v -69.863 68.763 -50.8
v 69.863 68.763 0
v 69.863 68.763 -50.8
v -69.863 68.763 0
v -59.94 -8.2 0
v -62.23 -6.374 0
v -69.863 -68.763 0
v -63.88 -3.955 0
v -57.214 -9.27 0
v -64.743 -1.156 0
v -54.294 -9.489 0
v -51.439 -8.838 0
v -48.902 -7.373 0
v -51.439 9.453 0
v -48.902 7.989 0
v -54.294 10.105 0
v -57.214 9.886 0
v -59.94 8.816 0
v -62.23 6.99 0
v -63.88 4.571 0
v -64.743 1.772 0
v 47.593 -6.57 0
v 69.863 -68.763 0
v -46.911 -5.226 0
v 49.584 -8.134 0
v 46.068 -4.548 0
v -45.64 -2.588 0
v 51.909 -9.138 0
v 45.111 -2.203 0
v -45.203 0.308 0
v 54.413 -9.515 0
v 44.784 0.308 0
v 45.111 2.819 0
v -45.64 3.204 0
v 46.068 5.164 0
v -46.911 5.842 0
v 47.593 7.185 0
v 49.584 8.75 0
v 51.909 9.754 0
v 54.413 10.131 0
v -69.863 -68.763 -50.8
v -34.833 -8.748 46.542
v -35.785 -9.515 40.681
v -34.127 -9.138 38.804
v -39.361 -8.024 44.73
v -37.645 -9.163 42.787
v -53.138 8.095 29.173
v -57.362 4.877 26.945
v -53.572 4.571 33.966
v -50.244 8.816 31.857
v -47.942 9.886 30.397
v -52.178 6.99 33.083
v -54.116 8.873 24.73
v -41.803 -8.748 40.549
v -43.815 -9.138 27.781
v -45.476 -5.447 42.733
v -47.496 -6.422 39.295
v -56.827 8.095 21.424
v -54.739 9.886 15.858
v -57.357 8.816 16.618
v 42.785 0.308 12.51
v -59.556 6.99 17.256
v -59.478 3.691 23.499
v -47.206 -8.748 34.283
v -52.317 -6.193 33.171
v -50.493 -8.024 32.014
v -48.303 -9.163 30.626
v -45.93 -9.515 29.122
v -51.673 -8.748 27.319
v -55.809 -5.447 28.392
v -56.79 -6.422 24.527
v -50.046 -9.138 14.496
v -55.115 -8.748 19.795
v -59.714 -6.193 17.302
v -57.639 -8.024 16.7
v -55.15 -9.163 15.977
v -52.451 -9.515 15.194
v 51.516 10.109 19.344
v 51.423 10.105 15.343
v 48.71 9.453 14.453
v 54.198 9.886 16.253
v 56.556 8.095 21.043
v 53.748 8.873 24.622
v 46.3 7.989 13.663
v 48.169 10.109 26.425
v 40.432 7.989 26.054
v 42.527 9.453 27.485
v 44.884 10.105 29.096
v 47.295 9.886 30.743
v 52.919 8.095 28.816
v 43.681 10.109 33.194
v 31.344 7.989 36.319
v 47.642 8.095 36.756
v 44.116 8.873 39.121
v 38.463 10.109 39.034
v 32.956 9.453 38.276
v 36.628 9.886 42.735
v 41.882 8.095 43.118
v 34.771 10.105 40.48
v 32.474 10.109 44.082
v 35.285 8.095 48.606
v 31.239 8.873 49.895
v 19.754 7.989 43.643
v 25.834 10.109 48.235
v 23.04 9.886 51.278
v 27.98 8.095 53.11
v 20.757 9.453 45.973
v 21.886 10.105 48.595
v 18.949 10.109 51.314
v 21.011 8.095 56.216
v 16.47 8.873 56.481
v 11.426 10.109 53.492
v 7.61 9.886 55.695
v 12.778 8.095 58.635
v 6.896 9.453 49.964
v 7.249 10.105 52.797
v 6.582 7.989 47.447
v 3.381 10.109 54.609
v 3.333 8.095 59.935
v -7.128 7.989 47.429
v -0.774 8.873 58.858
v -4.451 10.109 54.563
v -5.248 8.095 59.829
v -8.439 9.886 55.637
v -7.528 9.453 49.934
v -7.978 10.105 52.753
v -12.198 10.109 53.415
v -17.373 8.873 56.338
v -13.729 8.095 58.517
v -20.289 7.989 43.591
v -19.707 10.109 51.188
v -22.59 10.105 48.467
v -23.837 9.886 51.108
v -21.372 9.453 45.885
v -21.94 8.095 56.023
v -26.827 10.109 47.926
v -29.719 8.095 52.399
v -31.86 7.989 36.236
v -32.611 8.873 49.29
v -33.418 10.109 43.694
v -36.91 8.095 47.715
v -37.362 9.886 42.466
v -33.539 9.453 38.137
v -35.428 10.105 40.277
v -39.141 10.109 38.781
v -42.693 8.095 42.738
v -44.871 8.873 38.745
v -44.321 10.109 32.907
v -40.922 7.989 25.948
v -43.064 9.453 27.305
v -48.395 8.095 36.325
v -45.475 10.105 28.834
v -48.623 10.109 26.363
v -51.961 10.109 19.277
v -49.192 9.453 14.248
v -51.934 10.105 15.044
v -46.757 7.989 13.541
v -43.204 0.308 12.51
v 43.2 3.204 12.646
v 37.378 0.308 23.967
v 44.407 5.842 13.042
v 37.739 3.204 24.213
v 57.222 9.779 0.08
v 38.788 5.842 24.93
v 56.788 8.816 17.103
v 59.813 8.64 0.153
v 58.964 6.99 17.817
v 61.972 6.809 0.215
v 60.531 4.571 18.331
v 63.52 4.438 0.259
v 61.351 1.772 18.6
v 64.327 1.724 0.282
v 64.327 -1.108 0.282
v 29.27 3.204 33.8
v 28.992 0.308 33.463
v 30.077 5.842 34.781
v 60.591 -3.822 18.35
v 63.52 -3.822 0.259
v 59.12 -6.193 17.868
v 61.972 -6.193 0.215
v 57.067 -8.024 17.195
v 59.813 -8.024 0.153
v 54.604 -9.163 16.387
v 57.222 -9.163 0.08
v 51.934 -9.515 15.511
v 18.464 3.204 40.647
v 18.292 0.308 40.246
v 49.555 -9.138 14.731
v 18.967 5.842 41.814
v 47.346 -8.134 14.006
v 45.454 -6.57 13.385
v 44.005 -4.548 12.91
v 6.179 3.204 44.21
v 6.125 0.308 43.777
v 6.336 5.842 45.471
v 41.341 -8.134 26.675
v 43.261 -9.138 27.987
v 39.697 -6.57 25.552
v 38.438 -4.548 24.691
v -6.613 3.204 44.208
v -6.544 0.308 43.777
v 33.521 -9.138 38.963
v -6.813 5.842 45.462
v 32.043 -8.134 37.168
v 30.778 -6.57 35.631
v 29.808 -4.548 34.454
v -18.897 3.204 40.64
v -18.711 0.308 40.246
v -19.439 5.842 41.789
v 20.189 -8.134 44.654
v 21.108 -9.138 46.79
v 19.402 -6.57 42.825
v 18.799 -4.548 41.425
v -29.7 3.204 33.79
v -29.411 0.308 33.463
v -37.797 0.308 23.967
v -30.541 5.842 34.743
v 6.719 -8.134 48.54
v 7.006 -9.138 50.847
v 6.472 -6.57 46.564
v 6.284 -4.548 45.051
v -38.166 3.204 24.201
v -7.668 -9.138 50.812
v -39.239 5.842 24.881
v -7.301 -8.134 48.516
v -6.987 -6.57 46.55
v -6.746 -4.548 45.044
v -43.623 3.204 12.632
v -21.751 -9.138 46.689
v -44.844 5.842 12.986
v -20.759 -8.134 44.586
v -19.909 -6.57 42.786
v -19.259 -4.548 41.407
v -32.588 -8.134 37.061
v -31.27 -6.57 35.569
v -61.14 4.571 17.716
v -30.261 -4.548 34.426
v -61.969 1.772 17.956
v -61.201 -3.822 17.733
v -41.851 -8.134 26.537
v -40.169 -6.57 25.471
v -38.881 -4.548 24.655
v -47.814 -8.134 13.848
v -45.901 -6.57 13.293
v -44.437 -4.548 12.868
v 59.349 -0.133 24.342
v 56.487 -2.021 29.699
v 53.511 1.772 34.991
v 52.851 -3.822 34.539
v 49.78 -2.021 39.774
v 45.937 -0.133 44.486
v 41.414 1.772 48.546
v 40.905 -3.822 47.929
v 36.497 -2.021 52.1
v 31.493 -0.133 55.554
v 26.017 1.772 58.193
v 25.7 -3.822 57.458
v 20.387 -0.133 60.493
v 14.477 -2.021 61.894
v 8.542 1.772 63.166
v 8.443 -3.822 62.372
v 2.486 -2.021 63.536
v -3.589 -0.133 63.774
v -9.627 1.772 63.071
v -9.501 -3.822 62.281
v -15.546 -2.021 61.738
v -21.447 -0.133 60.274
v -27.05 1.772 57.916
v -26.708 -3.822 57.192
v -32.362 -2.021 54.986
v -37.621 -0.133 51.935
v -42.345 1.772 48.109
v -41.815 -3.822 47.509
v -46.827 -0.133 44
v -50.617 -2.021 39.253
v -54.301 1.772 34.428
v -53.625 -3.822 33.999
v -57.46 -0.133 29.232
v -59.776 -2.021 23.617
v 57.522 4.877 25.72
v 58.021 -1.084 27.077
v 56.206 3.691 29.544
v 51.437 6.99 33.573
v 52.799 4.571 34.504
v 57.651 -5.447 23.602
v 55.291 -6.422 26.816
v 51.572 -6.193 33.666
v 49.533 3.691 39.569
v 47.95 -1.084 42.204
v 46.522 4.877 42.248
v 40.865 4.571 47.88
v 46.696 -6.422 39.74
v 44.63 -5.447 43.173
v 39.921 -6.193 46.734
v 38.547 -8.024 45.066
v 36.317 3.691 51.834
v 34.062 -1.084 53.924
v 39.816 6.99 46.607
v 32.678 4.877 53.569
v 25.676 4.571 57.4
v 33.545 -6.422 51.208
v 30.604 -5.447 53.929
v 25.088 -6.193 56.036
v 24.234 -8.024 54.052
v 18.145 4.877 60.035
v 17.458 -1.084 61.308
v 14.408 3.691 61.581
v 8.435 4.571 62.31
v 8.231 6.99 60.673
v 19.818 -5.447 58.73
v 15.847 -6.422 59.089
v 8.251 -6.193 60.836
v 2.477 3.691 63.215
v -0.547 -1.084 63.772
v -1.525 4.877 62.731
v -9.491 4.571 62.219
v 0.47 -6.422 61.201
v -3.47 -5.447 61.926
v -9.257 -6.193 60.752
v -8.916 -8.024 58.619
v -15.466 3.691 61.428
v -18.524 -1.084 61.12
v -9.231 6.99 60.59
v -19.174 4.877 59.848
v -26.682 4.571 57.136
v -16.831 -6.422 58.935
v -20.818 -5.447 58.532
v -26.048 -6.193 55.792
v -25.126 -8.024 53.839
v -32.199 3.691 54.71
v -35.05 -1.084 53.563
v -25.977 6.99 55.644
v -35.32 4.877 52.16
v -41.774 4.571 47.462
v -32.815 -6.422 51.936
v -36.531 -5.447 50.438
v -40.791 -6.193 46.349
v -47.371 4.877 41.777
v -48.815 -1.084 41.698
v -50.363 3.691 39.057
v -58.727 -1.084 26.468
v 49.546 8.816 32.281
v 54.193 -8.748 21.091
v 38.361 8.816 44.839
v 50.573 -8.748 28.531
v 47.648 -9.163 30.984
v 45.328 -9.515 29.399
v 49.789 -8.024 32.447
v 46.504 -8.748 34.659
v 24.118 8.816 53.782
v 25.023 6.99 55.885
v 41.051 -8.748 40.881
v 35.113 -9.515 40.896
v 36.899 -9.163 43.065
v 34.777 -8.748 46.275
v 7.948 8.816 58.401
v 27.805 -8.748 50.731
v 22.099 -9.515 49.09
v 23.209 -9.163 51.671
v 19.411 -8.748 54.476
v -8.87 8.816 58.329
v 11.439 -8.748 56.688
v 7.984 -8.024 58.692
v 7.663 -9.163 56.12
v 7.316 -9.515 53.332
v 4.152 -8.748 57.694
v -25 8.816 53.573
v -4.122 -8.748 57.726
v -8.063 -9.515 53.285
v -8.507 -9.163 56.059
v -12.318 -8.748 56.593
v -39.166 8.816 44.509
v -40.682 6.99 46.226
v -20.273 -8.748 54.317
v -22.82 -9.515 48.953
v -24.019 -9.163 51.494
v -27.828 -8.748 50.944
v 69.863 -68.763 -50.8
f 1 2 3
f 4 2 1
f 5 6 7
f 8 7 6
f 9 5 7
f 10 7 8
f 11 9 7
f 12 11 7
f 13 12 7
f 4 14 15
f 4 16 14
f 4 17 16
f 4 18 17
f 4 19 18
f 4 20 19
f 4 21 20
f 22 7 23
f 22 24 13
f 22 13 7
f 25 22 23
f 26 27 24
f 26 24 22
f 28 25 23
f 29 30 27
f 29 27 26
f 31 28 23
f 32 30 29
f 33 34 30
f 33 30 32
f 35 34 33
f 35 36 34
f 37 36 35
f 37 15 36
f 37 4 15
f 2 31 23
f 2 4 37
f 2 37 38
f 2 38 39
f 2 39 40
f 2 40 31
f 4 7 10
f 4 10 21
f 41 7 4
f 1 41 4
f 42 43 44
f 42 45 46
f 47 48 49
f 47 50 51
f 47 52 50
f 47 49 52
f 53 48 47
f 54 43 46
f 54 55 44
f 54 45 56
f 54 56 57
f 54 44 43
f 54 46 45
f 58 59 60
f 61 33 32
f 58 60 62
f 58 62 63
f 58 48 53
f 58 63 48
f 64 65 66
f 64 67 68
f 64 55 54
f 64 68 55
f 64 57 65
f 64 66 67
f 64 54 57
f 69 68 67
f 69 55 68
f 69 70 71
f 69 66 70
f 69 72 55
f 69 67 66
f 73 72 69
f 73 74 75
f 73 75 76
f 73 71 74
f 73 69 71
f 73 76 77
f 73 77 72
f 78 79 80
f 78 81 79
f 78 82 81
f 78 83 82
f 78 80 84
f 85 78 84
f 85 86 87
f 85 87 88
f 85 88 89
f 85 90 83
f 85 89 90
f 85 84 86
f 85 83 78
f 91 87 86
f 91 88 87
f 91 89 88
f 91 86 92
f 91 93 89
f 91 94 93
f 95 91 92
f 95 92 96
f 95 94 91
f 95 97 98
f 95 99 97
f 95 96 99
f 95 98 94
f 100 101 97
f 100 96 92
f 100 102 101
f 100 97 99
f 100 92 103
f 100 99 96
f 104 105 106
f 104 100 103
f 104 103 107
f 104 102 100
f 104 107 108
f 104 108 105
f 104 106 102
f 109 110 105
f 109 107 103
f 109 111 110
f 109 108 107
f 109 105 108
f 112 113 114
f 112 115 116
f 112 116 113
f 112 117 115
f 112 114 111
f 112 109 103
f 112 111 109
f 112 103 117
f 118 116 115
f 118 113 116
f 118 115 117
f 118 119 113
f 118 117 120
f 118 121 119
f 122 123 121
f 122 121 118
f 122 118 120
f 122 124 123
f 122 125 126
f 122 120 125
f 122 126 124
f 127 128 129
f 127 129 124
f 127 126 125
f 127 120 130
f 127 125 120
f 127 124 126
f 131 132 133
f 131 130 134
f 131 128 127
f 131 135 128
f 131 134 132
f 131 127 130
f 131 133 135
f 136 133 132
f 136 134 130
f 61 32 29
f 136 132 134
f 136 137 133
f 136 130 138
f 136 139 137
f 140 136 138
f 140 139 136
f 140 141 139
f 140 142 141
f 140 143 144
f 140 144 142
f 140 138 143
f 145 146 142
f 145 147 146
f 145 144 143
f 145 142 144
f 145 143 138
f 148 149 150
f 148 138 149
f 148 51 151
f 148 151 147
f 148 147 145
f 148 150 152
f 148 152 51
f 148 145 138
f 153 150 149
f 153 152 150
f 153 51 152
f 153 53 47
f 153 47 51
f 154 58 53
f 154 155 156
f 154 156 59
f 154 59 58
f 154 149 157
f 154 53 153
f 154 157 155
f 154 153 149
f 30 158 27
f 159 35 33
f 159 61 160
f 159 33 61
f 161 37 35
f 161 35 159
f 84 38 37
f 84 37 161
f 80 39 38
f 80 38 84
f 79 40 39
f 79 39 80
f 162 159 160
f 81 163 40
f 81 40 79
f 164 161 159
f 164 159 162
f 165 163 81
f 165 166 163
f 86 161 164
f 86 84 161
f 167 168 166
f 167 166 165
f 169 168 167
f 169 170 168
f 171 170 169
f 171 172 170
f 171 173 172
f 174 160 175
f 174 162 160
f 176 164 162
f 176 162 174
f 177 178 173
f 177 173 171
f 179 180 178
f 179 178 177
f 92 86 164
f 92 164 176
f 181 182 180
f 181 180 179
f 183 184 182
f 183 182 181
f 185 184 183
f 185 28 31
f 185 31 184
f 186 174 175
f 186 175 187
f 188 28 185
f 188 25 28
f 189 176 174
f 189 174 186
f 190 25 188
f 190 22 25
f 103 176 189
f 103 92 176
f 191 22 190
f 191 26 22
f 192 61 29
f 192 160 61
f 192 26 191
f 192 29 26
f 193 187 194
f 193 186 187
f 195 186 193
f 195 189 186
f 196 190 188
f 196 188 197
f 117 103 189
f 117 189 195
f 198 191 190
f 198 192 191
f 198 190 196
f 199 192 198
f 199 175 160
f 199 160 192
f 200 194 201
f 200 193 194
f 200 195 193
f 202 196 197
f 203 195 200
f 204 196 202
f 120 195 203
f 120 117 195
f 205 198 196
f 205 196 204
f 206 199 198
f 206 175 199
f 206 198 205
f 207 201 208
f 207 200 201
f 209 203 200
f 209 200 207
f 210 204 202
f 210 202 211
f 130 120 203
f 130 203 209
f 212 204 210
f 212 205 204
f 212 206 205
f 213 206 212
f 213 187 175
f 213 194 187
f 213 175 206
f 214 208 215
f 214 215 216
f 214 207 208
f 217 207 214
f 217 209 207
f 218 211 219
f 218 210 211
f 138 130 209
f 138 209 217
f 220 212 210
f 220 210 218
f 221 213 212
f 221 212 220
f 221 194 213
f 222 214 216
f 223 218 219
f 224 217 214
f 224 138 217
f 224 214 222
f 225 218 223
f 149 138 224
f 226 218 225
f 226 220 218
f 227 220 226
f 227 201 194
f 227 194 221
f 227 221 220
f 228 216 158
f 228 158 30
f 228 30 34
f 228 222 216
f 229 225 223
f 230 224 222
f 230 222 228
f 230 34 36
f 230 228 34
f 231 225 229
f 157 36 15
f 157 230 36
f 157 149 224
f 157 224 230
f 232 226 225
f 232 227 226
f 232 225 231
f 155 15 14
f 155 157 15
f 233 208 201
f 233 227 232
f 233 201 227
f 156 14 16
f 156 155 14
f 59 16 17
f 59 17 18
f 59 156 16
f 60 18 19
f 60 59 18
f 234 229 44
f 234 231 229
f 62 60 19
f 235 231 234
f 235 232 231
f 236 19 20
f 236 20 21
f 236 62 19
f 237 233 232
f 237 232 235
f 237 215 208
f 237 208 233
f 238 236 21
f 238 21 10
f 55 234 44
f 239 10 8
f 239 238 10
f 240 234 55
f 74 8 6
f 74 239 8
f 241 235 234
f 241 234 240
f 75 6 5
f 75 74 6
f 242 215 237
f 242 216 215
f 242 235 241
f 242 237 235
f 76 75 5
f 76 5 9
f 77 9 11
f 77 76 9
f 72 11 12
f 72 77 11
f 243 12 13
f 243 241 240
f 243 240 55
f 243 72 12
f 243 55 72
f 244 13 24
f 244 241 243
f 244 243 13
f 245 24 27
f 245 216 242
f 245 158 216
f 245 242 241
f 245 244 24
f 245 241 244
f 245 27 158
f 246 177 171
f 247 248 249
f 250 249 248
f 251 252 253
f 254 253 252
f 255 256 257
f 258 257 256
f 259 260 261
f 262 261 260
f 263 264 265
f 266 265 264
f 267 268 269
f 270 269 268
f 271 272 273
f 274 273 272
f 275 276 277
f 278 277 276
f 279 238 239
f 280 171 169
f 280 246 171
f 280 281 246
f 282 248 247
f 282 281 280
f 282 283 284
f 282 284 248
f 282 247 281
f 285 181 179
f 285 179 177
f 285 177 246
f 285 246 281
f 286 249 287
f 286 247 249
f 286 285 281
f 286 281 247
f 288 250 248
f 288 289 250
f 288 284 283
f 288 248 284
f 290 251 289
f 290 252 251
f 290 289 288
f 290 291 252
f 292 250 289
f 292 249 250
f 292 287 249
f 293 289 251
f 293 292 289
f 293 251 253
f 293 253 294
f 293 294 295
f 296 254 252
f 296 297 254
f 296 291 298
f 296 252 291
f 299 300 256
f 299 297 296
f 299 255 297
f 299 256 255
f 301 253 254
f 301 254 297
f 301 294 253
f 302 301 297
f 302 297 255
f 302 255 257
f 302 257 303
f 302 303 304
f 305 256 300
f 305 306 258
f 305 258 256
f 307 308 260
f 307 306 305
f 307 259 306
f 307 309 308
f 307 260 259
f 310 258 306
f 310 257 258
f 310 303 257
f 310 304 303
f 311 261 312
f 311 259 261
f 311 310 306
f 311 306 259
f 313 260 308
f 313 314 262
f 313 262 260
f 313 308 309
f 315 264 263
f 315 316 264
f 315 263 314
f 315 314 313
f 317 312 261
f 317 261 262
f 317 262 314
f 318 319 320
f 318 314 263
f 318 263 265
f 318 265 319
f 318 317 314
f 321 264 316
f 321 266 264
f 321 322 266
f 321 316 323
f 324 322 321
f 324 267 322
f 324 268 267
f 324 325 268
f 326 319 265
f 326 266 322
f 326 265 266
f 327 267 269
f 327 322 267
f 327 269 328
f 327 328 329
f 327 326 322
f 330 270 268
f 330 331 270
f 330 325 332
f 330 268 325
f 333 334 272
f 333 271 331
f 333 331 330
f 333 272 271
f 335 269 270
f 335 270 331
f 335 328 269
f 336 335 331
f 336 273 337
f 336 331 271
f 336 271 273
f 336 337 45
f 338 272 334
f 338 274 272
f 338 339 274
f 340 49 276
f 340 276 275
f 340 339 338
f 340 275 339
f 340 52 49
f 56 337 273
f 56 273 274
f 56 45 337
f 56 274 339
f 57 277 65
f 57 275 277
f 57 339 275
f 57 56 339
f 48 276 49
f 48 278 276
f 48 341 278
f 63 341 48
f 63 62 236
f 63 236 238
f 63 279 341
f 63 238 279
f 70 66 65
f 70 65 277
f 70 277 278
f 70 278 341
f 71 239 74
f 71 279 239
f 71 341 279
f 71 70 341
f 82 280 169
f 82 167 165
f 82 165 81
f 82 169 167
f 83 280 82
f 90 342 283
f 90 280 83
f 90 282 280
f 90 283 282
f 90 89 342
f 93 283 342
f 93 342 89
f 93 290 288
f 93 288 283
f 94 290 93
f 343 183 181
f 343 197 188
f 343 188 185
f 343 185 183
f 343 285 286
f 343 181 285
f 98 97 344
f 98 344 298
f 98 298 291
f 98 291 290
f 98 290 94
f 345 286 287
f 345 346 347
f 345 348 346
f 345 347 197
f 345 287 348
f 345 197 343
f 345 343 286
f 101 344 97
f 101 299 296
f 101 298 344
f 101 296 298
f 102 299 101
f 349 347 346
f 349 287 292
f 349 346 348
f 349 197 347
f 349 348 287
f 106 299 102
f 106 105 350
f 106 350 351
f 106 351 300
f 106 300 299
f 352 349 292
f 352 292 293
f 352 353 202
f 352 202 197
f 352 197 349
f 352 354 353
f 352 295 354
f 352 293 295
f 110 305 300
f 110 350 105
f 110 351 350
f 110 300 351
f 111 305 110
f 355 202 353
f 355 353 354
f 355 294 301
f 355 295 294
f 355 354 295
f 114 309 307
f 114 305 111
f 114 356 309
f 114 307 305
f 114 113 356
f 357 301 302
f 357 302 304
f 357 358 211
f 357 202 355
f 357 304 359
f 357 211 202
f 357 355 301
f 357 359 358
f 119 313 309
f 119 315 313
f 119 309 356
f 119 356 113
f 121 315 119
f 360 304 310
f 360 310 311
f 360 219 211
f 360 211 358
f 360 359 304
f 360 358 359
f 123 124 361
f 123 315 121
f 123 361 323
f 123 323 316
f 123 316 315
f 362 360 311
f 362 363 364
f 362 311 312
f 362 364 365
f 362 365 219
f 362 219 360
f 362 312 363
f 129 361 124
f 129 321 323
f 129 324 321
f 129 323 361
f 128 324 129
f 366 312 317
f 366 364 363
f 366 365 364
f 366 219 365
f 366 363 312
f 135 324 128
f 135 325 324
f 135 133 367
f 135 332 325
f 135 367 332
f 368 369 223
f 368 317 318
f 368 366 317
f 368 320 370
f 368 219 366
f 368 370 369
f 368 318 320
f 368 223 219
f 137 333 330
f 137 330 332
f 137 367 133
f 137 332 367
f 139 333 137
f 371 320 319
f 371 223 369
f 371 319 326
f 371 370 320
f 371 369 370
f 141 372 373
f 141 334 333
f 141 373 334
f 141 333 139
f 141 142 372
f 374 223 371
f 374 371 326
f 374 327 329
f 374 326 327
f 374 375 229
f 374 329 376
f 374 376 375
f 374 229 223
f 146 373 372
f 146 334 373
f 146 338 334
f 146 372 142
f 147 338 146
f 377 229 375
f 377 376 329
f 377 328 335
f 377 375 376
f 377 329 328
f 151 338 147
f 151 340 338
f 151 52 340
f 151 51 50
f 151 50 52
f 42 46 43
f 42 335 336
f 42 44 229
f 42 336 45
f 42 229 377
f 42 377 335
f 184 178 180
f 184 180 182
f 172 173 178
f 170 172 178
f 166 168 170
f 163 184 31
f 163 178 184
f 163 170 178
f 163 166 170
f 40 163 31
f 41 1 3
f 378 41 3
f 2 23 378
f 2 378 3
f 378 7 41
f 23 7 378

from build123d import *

# Parameters (mm, degrees)
F0_W     = 69.863096
F0_H     = 137.526572
F1_DEPTH = 50.8
F2_R     = 9.824635


with BuildPart() as f1:
    # F0 (on Top) → F1 (new body)
    with BuildSketch(Plane.XY):
        with Locations((-34.931548, 0)):
            Rectangle(F0_W, F0_H)
        with Locations((34.931548, 0)):
            Rectangle(F0_W, F0_H)
    extrude(amount=-F1_DEPTH)

    # F4: sweep along a path in F3
    with BuildLine(Plane.XZ) as f4_path:
        ThreePointArc((54.413196, 0), (-0.209475, 53.852413), (-54.832146, 0))
    # F2 (on face) → F4 (sweep)
    with BuildSketch(Plane.XY):
        with Locations((-55.027995, 0.307959)):
            Circle(F2_R)
    sweep(path=f4_path.line)


solid = f1.part
